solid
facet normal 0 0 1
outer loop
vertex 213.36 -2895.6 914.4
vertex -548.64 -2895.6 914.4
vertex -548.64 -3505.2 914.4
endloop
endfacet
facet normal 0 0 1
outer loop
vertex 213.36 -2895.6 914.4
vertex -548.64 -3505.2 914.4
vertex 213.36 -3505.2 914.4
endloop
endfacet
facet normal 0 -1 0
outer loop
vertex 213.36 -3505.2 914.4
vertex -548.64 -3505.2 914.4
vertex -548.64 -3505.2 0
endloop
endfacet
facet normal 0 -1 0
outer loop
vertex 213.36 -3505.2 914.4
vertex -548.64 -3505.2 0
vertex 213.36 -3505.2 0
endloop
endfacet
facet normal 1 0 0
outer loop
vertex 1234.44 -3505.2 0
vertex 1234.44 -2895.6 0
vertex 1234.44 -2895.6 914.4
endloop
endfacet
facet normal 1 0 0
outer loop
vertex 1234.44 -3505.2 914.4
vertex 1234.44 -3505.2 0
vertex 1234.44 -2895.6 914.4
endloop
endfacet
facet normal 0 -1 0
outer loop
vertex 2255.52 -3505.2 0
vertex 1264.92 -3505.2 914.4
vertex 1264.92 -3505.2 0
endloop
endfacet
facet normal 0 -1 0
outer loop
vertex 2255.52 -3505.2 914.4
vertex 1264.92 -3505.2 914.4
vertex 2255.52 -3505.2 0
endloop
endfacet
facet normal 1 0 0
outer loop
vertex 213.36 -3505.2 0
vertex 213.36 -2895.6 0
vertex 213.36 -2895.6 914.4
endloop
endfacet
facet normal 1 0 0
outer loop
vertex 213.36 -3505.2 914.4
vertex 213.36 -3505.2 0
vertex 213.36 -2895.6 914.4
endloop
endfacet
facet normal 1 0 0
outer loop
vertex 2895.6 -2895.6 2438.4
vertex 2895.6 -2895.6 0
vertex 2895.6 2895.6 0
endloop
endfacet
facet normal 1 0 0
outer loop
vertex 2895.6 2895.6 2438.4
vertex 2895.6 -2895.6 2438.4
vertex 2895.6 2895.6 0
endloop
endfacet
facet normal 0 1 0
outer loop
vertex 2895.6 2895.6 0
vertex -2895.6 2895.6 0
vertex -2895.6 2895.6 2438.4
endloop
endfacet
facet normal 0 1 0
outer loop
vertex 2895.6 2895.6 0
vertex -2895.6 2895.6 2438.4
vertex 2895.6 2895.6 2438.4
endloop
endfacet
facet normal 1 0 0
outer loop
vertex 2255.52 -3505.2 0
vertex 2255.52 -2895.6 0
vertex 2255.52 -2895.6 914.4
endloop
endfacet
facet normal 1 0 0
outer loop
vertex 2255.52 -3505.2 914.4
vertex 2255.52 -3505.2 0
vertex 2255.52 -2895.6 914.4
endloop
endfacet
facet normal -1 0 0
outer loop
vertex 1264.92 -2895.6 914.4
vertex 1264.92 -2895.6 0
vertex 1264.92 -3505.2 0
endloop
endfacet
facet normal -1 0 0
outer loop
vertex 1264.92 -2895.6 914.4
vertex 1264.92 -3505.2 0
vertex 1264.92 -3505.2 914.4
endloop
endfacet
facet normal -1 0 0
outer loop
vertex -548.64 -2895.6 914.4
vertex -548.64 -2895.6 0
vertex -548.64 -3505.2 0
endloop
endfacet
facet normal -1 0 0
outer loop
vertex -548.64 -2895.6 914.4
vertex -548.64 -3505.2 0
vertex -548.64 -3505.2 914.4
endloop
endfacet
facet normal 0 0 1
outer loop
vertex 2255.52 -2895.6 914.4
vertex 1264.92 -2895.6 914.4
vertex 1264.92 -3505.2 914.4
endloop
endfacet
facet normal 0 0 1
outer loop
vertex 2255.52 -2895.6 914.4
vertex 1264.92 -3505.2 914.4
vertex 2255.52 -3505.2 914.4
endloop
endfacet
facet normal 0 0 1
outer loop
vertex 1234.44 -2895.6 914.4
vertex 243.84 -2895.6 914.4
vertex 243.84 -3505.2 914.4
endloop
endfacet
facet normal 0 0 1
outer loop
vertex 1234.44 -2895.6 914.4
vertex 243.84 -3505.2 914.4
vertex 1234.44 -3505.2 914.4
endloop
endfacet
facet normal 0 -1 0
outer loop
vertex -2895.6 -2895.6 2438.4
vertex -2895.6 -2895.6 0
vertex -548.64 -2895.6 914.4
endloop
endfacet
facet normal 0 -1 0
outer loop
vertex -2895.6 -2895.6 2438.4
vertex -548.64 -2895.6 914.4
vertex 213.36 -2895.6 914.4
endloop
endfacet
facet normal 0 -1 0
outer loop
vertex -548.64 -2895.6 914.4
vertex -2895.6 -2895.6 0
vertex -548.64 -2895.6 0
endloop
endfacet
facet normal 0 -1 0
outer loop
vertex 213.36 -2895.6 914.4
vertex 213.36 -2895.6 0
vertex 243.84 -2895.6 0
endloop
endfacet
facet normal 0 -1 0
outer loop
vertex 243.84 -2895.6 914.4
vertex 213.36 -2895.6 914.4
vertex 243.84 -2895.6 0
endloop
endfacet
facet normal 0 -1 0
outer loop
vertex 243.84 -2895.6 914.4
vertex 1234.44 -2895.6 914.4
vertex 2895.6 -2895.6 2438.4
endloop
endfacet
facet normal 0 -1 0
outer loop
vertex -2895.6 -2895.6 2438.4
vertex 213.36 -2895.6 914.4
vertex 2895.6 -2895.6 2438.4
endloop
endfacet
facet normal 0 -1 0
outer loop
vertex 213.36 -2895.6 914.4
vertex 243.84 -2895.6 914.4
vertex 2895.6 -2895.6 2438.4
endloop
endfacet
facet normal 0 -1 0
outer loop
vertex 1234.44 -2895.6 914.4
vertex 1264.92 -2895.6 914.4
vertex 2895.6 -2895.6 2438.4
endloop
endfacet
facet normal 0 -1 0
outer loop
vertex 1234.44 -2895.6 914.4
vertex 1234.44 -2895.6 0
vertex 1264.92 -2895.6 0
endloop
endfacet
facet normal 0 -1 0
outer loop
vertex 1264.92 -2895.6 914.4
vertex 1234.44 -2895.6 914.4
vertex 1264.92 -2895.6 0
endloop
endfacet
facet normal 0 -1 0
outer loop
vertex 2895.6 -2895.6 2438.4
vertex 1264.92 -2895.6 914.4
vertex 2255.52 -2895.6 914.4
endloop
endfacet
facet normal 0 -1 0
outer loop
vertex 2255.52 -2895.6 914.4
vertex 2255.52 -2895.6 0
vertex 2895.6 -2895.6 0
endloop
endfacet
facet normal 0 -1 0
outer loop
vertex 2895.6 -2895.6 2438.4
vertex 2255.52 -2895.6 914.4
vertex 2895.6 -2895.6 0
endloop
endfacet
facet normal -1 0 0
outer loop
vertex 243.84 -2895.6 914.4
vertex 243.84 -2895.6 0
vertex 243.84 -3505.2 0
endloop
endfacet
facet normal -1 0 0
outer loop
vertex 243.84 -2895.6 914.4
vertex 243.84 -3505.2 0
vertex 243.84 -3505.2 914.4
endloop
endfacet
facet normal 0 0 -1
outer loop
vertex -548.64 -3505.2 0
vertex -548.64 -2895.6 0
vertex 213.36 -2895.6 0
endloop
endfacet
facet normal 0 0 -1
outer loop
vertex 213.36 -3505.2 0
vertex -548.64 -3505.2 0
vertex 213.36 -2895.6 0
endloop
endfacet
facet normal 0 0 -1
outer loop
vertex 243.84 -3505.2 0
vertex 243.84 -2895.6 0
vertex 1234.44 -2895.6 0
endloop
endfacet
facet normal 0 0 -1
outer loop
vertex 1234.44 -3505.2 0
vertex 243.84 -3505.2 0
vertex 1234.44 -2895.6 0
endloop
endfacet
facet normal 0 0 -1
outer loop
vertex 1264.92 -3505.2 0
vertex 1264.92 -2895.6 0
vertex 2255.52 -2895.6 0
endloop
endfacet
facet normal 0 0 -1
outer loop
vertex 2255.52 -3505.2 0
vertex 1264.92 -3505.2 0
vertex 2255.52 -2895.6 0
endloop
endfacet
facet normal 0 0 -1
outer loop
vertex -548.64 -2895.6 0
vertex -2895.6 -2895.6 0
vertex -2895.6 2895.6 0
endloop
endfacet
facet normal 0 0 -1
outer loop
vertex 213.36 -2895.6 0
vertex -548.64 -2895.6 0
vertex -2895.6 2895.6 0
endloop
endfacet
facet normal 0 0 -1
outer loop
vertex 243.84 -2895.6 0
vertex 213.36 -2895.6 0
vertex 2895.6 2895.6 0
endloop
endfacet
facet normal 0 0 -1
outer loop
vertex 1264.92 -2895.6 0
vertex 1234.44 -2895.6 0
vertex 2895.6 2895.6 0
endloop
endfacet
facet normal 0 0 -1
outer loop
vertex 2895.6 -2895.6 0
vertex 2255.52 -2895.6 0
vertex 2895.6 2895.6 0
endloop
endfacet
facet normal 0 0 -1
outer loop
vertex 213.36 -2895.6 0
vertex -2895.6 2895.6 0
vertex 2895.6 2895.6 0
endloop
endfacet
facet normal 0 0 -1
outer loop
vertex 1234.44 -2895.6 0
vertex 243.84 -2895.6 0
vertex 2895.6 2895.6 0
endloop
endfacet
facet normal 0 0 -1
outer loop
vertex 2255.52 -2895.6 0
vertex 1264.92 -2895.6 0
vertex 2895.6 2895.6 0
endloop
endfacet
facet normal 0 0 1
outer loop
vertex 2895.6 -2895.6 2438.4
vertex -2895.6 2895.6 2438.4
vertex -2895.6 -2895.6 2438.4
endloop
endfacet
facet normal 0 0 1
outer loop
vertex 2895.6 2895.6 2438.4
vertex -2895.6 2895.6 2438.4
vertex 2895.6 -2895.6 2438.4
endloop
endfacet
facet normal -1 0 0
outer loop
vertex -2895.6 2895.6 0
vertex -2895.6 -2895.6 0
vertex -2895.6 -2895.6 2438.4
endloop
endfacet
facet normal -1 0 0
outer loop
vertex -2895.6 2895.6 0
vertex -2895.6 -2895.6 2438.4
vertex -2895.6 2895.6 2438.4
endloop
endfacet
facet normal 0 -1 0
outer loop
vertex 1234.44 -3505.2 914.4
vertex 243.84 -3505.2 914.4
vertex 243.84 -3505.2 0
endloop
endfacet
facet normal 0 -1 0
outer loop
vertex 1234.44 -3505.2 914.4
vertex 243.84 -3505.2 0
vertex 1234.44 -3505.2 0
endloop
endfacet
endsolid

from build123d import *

# Parameters (mm, degrees)
F0_W     = 5791.2
F0_H     = 5791.2
F1_DEPTH = 2438.4
F2_W     = 762
F2_H     = 914.4
F2_W_2   = 990.6
F3_DEPTH = 609.6


with BuildPart() as f1:
    # F0 (on Top) → F1 (new body)
    with BuildSketch(Plane.XY):
        Rectangle(F0_W, F0_H)
    extrude(amount=F1_DEPTH)

    # F2 (on face) → F3 (join)
    with BuildSketch(Plane.XZ.offset(2895.6)):
        with Locations((-167.64, 457.2)):
            Rectangle(F2_W, F2_H)
        with Locations((739.14, 457.2)):
            Rectangle(F2_W_2, F2_H)
        with Locations((1760.22, 457.2)):
            Rectangle(F2_W_2, F2_H)
    extrude(amount=F3_DEPTH)


solid = f1.part
